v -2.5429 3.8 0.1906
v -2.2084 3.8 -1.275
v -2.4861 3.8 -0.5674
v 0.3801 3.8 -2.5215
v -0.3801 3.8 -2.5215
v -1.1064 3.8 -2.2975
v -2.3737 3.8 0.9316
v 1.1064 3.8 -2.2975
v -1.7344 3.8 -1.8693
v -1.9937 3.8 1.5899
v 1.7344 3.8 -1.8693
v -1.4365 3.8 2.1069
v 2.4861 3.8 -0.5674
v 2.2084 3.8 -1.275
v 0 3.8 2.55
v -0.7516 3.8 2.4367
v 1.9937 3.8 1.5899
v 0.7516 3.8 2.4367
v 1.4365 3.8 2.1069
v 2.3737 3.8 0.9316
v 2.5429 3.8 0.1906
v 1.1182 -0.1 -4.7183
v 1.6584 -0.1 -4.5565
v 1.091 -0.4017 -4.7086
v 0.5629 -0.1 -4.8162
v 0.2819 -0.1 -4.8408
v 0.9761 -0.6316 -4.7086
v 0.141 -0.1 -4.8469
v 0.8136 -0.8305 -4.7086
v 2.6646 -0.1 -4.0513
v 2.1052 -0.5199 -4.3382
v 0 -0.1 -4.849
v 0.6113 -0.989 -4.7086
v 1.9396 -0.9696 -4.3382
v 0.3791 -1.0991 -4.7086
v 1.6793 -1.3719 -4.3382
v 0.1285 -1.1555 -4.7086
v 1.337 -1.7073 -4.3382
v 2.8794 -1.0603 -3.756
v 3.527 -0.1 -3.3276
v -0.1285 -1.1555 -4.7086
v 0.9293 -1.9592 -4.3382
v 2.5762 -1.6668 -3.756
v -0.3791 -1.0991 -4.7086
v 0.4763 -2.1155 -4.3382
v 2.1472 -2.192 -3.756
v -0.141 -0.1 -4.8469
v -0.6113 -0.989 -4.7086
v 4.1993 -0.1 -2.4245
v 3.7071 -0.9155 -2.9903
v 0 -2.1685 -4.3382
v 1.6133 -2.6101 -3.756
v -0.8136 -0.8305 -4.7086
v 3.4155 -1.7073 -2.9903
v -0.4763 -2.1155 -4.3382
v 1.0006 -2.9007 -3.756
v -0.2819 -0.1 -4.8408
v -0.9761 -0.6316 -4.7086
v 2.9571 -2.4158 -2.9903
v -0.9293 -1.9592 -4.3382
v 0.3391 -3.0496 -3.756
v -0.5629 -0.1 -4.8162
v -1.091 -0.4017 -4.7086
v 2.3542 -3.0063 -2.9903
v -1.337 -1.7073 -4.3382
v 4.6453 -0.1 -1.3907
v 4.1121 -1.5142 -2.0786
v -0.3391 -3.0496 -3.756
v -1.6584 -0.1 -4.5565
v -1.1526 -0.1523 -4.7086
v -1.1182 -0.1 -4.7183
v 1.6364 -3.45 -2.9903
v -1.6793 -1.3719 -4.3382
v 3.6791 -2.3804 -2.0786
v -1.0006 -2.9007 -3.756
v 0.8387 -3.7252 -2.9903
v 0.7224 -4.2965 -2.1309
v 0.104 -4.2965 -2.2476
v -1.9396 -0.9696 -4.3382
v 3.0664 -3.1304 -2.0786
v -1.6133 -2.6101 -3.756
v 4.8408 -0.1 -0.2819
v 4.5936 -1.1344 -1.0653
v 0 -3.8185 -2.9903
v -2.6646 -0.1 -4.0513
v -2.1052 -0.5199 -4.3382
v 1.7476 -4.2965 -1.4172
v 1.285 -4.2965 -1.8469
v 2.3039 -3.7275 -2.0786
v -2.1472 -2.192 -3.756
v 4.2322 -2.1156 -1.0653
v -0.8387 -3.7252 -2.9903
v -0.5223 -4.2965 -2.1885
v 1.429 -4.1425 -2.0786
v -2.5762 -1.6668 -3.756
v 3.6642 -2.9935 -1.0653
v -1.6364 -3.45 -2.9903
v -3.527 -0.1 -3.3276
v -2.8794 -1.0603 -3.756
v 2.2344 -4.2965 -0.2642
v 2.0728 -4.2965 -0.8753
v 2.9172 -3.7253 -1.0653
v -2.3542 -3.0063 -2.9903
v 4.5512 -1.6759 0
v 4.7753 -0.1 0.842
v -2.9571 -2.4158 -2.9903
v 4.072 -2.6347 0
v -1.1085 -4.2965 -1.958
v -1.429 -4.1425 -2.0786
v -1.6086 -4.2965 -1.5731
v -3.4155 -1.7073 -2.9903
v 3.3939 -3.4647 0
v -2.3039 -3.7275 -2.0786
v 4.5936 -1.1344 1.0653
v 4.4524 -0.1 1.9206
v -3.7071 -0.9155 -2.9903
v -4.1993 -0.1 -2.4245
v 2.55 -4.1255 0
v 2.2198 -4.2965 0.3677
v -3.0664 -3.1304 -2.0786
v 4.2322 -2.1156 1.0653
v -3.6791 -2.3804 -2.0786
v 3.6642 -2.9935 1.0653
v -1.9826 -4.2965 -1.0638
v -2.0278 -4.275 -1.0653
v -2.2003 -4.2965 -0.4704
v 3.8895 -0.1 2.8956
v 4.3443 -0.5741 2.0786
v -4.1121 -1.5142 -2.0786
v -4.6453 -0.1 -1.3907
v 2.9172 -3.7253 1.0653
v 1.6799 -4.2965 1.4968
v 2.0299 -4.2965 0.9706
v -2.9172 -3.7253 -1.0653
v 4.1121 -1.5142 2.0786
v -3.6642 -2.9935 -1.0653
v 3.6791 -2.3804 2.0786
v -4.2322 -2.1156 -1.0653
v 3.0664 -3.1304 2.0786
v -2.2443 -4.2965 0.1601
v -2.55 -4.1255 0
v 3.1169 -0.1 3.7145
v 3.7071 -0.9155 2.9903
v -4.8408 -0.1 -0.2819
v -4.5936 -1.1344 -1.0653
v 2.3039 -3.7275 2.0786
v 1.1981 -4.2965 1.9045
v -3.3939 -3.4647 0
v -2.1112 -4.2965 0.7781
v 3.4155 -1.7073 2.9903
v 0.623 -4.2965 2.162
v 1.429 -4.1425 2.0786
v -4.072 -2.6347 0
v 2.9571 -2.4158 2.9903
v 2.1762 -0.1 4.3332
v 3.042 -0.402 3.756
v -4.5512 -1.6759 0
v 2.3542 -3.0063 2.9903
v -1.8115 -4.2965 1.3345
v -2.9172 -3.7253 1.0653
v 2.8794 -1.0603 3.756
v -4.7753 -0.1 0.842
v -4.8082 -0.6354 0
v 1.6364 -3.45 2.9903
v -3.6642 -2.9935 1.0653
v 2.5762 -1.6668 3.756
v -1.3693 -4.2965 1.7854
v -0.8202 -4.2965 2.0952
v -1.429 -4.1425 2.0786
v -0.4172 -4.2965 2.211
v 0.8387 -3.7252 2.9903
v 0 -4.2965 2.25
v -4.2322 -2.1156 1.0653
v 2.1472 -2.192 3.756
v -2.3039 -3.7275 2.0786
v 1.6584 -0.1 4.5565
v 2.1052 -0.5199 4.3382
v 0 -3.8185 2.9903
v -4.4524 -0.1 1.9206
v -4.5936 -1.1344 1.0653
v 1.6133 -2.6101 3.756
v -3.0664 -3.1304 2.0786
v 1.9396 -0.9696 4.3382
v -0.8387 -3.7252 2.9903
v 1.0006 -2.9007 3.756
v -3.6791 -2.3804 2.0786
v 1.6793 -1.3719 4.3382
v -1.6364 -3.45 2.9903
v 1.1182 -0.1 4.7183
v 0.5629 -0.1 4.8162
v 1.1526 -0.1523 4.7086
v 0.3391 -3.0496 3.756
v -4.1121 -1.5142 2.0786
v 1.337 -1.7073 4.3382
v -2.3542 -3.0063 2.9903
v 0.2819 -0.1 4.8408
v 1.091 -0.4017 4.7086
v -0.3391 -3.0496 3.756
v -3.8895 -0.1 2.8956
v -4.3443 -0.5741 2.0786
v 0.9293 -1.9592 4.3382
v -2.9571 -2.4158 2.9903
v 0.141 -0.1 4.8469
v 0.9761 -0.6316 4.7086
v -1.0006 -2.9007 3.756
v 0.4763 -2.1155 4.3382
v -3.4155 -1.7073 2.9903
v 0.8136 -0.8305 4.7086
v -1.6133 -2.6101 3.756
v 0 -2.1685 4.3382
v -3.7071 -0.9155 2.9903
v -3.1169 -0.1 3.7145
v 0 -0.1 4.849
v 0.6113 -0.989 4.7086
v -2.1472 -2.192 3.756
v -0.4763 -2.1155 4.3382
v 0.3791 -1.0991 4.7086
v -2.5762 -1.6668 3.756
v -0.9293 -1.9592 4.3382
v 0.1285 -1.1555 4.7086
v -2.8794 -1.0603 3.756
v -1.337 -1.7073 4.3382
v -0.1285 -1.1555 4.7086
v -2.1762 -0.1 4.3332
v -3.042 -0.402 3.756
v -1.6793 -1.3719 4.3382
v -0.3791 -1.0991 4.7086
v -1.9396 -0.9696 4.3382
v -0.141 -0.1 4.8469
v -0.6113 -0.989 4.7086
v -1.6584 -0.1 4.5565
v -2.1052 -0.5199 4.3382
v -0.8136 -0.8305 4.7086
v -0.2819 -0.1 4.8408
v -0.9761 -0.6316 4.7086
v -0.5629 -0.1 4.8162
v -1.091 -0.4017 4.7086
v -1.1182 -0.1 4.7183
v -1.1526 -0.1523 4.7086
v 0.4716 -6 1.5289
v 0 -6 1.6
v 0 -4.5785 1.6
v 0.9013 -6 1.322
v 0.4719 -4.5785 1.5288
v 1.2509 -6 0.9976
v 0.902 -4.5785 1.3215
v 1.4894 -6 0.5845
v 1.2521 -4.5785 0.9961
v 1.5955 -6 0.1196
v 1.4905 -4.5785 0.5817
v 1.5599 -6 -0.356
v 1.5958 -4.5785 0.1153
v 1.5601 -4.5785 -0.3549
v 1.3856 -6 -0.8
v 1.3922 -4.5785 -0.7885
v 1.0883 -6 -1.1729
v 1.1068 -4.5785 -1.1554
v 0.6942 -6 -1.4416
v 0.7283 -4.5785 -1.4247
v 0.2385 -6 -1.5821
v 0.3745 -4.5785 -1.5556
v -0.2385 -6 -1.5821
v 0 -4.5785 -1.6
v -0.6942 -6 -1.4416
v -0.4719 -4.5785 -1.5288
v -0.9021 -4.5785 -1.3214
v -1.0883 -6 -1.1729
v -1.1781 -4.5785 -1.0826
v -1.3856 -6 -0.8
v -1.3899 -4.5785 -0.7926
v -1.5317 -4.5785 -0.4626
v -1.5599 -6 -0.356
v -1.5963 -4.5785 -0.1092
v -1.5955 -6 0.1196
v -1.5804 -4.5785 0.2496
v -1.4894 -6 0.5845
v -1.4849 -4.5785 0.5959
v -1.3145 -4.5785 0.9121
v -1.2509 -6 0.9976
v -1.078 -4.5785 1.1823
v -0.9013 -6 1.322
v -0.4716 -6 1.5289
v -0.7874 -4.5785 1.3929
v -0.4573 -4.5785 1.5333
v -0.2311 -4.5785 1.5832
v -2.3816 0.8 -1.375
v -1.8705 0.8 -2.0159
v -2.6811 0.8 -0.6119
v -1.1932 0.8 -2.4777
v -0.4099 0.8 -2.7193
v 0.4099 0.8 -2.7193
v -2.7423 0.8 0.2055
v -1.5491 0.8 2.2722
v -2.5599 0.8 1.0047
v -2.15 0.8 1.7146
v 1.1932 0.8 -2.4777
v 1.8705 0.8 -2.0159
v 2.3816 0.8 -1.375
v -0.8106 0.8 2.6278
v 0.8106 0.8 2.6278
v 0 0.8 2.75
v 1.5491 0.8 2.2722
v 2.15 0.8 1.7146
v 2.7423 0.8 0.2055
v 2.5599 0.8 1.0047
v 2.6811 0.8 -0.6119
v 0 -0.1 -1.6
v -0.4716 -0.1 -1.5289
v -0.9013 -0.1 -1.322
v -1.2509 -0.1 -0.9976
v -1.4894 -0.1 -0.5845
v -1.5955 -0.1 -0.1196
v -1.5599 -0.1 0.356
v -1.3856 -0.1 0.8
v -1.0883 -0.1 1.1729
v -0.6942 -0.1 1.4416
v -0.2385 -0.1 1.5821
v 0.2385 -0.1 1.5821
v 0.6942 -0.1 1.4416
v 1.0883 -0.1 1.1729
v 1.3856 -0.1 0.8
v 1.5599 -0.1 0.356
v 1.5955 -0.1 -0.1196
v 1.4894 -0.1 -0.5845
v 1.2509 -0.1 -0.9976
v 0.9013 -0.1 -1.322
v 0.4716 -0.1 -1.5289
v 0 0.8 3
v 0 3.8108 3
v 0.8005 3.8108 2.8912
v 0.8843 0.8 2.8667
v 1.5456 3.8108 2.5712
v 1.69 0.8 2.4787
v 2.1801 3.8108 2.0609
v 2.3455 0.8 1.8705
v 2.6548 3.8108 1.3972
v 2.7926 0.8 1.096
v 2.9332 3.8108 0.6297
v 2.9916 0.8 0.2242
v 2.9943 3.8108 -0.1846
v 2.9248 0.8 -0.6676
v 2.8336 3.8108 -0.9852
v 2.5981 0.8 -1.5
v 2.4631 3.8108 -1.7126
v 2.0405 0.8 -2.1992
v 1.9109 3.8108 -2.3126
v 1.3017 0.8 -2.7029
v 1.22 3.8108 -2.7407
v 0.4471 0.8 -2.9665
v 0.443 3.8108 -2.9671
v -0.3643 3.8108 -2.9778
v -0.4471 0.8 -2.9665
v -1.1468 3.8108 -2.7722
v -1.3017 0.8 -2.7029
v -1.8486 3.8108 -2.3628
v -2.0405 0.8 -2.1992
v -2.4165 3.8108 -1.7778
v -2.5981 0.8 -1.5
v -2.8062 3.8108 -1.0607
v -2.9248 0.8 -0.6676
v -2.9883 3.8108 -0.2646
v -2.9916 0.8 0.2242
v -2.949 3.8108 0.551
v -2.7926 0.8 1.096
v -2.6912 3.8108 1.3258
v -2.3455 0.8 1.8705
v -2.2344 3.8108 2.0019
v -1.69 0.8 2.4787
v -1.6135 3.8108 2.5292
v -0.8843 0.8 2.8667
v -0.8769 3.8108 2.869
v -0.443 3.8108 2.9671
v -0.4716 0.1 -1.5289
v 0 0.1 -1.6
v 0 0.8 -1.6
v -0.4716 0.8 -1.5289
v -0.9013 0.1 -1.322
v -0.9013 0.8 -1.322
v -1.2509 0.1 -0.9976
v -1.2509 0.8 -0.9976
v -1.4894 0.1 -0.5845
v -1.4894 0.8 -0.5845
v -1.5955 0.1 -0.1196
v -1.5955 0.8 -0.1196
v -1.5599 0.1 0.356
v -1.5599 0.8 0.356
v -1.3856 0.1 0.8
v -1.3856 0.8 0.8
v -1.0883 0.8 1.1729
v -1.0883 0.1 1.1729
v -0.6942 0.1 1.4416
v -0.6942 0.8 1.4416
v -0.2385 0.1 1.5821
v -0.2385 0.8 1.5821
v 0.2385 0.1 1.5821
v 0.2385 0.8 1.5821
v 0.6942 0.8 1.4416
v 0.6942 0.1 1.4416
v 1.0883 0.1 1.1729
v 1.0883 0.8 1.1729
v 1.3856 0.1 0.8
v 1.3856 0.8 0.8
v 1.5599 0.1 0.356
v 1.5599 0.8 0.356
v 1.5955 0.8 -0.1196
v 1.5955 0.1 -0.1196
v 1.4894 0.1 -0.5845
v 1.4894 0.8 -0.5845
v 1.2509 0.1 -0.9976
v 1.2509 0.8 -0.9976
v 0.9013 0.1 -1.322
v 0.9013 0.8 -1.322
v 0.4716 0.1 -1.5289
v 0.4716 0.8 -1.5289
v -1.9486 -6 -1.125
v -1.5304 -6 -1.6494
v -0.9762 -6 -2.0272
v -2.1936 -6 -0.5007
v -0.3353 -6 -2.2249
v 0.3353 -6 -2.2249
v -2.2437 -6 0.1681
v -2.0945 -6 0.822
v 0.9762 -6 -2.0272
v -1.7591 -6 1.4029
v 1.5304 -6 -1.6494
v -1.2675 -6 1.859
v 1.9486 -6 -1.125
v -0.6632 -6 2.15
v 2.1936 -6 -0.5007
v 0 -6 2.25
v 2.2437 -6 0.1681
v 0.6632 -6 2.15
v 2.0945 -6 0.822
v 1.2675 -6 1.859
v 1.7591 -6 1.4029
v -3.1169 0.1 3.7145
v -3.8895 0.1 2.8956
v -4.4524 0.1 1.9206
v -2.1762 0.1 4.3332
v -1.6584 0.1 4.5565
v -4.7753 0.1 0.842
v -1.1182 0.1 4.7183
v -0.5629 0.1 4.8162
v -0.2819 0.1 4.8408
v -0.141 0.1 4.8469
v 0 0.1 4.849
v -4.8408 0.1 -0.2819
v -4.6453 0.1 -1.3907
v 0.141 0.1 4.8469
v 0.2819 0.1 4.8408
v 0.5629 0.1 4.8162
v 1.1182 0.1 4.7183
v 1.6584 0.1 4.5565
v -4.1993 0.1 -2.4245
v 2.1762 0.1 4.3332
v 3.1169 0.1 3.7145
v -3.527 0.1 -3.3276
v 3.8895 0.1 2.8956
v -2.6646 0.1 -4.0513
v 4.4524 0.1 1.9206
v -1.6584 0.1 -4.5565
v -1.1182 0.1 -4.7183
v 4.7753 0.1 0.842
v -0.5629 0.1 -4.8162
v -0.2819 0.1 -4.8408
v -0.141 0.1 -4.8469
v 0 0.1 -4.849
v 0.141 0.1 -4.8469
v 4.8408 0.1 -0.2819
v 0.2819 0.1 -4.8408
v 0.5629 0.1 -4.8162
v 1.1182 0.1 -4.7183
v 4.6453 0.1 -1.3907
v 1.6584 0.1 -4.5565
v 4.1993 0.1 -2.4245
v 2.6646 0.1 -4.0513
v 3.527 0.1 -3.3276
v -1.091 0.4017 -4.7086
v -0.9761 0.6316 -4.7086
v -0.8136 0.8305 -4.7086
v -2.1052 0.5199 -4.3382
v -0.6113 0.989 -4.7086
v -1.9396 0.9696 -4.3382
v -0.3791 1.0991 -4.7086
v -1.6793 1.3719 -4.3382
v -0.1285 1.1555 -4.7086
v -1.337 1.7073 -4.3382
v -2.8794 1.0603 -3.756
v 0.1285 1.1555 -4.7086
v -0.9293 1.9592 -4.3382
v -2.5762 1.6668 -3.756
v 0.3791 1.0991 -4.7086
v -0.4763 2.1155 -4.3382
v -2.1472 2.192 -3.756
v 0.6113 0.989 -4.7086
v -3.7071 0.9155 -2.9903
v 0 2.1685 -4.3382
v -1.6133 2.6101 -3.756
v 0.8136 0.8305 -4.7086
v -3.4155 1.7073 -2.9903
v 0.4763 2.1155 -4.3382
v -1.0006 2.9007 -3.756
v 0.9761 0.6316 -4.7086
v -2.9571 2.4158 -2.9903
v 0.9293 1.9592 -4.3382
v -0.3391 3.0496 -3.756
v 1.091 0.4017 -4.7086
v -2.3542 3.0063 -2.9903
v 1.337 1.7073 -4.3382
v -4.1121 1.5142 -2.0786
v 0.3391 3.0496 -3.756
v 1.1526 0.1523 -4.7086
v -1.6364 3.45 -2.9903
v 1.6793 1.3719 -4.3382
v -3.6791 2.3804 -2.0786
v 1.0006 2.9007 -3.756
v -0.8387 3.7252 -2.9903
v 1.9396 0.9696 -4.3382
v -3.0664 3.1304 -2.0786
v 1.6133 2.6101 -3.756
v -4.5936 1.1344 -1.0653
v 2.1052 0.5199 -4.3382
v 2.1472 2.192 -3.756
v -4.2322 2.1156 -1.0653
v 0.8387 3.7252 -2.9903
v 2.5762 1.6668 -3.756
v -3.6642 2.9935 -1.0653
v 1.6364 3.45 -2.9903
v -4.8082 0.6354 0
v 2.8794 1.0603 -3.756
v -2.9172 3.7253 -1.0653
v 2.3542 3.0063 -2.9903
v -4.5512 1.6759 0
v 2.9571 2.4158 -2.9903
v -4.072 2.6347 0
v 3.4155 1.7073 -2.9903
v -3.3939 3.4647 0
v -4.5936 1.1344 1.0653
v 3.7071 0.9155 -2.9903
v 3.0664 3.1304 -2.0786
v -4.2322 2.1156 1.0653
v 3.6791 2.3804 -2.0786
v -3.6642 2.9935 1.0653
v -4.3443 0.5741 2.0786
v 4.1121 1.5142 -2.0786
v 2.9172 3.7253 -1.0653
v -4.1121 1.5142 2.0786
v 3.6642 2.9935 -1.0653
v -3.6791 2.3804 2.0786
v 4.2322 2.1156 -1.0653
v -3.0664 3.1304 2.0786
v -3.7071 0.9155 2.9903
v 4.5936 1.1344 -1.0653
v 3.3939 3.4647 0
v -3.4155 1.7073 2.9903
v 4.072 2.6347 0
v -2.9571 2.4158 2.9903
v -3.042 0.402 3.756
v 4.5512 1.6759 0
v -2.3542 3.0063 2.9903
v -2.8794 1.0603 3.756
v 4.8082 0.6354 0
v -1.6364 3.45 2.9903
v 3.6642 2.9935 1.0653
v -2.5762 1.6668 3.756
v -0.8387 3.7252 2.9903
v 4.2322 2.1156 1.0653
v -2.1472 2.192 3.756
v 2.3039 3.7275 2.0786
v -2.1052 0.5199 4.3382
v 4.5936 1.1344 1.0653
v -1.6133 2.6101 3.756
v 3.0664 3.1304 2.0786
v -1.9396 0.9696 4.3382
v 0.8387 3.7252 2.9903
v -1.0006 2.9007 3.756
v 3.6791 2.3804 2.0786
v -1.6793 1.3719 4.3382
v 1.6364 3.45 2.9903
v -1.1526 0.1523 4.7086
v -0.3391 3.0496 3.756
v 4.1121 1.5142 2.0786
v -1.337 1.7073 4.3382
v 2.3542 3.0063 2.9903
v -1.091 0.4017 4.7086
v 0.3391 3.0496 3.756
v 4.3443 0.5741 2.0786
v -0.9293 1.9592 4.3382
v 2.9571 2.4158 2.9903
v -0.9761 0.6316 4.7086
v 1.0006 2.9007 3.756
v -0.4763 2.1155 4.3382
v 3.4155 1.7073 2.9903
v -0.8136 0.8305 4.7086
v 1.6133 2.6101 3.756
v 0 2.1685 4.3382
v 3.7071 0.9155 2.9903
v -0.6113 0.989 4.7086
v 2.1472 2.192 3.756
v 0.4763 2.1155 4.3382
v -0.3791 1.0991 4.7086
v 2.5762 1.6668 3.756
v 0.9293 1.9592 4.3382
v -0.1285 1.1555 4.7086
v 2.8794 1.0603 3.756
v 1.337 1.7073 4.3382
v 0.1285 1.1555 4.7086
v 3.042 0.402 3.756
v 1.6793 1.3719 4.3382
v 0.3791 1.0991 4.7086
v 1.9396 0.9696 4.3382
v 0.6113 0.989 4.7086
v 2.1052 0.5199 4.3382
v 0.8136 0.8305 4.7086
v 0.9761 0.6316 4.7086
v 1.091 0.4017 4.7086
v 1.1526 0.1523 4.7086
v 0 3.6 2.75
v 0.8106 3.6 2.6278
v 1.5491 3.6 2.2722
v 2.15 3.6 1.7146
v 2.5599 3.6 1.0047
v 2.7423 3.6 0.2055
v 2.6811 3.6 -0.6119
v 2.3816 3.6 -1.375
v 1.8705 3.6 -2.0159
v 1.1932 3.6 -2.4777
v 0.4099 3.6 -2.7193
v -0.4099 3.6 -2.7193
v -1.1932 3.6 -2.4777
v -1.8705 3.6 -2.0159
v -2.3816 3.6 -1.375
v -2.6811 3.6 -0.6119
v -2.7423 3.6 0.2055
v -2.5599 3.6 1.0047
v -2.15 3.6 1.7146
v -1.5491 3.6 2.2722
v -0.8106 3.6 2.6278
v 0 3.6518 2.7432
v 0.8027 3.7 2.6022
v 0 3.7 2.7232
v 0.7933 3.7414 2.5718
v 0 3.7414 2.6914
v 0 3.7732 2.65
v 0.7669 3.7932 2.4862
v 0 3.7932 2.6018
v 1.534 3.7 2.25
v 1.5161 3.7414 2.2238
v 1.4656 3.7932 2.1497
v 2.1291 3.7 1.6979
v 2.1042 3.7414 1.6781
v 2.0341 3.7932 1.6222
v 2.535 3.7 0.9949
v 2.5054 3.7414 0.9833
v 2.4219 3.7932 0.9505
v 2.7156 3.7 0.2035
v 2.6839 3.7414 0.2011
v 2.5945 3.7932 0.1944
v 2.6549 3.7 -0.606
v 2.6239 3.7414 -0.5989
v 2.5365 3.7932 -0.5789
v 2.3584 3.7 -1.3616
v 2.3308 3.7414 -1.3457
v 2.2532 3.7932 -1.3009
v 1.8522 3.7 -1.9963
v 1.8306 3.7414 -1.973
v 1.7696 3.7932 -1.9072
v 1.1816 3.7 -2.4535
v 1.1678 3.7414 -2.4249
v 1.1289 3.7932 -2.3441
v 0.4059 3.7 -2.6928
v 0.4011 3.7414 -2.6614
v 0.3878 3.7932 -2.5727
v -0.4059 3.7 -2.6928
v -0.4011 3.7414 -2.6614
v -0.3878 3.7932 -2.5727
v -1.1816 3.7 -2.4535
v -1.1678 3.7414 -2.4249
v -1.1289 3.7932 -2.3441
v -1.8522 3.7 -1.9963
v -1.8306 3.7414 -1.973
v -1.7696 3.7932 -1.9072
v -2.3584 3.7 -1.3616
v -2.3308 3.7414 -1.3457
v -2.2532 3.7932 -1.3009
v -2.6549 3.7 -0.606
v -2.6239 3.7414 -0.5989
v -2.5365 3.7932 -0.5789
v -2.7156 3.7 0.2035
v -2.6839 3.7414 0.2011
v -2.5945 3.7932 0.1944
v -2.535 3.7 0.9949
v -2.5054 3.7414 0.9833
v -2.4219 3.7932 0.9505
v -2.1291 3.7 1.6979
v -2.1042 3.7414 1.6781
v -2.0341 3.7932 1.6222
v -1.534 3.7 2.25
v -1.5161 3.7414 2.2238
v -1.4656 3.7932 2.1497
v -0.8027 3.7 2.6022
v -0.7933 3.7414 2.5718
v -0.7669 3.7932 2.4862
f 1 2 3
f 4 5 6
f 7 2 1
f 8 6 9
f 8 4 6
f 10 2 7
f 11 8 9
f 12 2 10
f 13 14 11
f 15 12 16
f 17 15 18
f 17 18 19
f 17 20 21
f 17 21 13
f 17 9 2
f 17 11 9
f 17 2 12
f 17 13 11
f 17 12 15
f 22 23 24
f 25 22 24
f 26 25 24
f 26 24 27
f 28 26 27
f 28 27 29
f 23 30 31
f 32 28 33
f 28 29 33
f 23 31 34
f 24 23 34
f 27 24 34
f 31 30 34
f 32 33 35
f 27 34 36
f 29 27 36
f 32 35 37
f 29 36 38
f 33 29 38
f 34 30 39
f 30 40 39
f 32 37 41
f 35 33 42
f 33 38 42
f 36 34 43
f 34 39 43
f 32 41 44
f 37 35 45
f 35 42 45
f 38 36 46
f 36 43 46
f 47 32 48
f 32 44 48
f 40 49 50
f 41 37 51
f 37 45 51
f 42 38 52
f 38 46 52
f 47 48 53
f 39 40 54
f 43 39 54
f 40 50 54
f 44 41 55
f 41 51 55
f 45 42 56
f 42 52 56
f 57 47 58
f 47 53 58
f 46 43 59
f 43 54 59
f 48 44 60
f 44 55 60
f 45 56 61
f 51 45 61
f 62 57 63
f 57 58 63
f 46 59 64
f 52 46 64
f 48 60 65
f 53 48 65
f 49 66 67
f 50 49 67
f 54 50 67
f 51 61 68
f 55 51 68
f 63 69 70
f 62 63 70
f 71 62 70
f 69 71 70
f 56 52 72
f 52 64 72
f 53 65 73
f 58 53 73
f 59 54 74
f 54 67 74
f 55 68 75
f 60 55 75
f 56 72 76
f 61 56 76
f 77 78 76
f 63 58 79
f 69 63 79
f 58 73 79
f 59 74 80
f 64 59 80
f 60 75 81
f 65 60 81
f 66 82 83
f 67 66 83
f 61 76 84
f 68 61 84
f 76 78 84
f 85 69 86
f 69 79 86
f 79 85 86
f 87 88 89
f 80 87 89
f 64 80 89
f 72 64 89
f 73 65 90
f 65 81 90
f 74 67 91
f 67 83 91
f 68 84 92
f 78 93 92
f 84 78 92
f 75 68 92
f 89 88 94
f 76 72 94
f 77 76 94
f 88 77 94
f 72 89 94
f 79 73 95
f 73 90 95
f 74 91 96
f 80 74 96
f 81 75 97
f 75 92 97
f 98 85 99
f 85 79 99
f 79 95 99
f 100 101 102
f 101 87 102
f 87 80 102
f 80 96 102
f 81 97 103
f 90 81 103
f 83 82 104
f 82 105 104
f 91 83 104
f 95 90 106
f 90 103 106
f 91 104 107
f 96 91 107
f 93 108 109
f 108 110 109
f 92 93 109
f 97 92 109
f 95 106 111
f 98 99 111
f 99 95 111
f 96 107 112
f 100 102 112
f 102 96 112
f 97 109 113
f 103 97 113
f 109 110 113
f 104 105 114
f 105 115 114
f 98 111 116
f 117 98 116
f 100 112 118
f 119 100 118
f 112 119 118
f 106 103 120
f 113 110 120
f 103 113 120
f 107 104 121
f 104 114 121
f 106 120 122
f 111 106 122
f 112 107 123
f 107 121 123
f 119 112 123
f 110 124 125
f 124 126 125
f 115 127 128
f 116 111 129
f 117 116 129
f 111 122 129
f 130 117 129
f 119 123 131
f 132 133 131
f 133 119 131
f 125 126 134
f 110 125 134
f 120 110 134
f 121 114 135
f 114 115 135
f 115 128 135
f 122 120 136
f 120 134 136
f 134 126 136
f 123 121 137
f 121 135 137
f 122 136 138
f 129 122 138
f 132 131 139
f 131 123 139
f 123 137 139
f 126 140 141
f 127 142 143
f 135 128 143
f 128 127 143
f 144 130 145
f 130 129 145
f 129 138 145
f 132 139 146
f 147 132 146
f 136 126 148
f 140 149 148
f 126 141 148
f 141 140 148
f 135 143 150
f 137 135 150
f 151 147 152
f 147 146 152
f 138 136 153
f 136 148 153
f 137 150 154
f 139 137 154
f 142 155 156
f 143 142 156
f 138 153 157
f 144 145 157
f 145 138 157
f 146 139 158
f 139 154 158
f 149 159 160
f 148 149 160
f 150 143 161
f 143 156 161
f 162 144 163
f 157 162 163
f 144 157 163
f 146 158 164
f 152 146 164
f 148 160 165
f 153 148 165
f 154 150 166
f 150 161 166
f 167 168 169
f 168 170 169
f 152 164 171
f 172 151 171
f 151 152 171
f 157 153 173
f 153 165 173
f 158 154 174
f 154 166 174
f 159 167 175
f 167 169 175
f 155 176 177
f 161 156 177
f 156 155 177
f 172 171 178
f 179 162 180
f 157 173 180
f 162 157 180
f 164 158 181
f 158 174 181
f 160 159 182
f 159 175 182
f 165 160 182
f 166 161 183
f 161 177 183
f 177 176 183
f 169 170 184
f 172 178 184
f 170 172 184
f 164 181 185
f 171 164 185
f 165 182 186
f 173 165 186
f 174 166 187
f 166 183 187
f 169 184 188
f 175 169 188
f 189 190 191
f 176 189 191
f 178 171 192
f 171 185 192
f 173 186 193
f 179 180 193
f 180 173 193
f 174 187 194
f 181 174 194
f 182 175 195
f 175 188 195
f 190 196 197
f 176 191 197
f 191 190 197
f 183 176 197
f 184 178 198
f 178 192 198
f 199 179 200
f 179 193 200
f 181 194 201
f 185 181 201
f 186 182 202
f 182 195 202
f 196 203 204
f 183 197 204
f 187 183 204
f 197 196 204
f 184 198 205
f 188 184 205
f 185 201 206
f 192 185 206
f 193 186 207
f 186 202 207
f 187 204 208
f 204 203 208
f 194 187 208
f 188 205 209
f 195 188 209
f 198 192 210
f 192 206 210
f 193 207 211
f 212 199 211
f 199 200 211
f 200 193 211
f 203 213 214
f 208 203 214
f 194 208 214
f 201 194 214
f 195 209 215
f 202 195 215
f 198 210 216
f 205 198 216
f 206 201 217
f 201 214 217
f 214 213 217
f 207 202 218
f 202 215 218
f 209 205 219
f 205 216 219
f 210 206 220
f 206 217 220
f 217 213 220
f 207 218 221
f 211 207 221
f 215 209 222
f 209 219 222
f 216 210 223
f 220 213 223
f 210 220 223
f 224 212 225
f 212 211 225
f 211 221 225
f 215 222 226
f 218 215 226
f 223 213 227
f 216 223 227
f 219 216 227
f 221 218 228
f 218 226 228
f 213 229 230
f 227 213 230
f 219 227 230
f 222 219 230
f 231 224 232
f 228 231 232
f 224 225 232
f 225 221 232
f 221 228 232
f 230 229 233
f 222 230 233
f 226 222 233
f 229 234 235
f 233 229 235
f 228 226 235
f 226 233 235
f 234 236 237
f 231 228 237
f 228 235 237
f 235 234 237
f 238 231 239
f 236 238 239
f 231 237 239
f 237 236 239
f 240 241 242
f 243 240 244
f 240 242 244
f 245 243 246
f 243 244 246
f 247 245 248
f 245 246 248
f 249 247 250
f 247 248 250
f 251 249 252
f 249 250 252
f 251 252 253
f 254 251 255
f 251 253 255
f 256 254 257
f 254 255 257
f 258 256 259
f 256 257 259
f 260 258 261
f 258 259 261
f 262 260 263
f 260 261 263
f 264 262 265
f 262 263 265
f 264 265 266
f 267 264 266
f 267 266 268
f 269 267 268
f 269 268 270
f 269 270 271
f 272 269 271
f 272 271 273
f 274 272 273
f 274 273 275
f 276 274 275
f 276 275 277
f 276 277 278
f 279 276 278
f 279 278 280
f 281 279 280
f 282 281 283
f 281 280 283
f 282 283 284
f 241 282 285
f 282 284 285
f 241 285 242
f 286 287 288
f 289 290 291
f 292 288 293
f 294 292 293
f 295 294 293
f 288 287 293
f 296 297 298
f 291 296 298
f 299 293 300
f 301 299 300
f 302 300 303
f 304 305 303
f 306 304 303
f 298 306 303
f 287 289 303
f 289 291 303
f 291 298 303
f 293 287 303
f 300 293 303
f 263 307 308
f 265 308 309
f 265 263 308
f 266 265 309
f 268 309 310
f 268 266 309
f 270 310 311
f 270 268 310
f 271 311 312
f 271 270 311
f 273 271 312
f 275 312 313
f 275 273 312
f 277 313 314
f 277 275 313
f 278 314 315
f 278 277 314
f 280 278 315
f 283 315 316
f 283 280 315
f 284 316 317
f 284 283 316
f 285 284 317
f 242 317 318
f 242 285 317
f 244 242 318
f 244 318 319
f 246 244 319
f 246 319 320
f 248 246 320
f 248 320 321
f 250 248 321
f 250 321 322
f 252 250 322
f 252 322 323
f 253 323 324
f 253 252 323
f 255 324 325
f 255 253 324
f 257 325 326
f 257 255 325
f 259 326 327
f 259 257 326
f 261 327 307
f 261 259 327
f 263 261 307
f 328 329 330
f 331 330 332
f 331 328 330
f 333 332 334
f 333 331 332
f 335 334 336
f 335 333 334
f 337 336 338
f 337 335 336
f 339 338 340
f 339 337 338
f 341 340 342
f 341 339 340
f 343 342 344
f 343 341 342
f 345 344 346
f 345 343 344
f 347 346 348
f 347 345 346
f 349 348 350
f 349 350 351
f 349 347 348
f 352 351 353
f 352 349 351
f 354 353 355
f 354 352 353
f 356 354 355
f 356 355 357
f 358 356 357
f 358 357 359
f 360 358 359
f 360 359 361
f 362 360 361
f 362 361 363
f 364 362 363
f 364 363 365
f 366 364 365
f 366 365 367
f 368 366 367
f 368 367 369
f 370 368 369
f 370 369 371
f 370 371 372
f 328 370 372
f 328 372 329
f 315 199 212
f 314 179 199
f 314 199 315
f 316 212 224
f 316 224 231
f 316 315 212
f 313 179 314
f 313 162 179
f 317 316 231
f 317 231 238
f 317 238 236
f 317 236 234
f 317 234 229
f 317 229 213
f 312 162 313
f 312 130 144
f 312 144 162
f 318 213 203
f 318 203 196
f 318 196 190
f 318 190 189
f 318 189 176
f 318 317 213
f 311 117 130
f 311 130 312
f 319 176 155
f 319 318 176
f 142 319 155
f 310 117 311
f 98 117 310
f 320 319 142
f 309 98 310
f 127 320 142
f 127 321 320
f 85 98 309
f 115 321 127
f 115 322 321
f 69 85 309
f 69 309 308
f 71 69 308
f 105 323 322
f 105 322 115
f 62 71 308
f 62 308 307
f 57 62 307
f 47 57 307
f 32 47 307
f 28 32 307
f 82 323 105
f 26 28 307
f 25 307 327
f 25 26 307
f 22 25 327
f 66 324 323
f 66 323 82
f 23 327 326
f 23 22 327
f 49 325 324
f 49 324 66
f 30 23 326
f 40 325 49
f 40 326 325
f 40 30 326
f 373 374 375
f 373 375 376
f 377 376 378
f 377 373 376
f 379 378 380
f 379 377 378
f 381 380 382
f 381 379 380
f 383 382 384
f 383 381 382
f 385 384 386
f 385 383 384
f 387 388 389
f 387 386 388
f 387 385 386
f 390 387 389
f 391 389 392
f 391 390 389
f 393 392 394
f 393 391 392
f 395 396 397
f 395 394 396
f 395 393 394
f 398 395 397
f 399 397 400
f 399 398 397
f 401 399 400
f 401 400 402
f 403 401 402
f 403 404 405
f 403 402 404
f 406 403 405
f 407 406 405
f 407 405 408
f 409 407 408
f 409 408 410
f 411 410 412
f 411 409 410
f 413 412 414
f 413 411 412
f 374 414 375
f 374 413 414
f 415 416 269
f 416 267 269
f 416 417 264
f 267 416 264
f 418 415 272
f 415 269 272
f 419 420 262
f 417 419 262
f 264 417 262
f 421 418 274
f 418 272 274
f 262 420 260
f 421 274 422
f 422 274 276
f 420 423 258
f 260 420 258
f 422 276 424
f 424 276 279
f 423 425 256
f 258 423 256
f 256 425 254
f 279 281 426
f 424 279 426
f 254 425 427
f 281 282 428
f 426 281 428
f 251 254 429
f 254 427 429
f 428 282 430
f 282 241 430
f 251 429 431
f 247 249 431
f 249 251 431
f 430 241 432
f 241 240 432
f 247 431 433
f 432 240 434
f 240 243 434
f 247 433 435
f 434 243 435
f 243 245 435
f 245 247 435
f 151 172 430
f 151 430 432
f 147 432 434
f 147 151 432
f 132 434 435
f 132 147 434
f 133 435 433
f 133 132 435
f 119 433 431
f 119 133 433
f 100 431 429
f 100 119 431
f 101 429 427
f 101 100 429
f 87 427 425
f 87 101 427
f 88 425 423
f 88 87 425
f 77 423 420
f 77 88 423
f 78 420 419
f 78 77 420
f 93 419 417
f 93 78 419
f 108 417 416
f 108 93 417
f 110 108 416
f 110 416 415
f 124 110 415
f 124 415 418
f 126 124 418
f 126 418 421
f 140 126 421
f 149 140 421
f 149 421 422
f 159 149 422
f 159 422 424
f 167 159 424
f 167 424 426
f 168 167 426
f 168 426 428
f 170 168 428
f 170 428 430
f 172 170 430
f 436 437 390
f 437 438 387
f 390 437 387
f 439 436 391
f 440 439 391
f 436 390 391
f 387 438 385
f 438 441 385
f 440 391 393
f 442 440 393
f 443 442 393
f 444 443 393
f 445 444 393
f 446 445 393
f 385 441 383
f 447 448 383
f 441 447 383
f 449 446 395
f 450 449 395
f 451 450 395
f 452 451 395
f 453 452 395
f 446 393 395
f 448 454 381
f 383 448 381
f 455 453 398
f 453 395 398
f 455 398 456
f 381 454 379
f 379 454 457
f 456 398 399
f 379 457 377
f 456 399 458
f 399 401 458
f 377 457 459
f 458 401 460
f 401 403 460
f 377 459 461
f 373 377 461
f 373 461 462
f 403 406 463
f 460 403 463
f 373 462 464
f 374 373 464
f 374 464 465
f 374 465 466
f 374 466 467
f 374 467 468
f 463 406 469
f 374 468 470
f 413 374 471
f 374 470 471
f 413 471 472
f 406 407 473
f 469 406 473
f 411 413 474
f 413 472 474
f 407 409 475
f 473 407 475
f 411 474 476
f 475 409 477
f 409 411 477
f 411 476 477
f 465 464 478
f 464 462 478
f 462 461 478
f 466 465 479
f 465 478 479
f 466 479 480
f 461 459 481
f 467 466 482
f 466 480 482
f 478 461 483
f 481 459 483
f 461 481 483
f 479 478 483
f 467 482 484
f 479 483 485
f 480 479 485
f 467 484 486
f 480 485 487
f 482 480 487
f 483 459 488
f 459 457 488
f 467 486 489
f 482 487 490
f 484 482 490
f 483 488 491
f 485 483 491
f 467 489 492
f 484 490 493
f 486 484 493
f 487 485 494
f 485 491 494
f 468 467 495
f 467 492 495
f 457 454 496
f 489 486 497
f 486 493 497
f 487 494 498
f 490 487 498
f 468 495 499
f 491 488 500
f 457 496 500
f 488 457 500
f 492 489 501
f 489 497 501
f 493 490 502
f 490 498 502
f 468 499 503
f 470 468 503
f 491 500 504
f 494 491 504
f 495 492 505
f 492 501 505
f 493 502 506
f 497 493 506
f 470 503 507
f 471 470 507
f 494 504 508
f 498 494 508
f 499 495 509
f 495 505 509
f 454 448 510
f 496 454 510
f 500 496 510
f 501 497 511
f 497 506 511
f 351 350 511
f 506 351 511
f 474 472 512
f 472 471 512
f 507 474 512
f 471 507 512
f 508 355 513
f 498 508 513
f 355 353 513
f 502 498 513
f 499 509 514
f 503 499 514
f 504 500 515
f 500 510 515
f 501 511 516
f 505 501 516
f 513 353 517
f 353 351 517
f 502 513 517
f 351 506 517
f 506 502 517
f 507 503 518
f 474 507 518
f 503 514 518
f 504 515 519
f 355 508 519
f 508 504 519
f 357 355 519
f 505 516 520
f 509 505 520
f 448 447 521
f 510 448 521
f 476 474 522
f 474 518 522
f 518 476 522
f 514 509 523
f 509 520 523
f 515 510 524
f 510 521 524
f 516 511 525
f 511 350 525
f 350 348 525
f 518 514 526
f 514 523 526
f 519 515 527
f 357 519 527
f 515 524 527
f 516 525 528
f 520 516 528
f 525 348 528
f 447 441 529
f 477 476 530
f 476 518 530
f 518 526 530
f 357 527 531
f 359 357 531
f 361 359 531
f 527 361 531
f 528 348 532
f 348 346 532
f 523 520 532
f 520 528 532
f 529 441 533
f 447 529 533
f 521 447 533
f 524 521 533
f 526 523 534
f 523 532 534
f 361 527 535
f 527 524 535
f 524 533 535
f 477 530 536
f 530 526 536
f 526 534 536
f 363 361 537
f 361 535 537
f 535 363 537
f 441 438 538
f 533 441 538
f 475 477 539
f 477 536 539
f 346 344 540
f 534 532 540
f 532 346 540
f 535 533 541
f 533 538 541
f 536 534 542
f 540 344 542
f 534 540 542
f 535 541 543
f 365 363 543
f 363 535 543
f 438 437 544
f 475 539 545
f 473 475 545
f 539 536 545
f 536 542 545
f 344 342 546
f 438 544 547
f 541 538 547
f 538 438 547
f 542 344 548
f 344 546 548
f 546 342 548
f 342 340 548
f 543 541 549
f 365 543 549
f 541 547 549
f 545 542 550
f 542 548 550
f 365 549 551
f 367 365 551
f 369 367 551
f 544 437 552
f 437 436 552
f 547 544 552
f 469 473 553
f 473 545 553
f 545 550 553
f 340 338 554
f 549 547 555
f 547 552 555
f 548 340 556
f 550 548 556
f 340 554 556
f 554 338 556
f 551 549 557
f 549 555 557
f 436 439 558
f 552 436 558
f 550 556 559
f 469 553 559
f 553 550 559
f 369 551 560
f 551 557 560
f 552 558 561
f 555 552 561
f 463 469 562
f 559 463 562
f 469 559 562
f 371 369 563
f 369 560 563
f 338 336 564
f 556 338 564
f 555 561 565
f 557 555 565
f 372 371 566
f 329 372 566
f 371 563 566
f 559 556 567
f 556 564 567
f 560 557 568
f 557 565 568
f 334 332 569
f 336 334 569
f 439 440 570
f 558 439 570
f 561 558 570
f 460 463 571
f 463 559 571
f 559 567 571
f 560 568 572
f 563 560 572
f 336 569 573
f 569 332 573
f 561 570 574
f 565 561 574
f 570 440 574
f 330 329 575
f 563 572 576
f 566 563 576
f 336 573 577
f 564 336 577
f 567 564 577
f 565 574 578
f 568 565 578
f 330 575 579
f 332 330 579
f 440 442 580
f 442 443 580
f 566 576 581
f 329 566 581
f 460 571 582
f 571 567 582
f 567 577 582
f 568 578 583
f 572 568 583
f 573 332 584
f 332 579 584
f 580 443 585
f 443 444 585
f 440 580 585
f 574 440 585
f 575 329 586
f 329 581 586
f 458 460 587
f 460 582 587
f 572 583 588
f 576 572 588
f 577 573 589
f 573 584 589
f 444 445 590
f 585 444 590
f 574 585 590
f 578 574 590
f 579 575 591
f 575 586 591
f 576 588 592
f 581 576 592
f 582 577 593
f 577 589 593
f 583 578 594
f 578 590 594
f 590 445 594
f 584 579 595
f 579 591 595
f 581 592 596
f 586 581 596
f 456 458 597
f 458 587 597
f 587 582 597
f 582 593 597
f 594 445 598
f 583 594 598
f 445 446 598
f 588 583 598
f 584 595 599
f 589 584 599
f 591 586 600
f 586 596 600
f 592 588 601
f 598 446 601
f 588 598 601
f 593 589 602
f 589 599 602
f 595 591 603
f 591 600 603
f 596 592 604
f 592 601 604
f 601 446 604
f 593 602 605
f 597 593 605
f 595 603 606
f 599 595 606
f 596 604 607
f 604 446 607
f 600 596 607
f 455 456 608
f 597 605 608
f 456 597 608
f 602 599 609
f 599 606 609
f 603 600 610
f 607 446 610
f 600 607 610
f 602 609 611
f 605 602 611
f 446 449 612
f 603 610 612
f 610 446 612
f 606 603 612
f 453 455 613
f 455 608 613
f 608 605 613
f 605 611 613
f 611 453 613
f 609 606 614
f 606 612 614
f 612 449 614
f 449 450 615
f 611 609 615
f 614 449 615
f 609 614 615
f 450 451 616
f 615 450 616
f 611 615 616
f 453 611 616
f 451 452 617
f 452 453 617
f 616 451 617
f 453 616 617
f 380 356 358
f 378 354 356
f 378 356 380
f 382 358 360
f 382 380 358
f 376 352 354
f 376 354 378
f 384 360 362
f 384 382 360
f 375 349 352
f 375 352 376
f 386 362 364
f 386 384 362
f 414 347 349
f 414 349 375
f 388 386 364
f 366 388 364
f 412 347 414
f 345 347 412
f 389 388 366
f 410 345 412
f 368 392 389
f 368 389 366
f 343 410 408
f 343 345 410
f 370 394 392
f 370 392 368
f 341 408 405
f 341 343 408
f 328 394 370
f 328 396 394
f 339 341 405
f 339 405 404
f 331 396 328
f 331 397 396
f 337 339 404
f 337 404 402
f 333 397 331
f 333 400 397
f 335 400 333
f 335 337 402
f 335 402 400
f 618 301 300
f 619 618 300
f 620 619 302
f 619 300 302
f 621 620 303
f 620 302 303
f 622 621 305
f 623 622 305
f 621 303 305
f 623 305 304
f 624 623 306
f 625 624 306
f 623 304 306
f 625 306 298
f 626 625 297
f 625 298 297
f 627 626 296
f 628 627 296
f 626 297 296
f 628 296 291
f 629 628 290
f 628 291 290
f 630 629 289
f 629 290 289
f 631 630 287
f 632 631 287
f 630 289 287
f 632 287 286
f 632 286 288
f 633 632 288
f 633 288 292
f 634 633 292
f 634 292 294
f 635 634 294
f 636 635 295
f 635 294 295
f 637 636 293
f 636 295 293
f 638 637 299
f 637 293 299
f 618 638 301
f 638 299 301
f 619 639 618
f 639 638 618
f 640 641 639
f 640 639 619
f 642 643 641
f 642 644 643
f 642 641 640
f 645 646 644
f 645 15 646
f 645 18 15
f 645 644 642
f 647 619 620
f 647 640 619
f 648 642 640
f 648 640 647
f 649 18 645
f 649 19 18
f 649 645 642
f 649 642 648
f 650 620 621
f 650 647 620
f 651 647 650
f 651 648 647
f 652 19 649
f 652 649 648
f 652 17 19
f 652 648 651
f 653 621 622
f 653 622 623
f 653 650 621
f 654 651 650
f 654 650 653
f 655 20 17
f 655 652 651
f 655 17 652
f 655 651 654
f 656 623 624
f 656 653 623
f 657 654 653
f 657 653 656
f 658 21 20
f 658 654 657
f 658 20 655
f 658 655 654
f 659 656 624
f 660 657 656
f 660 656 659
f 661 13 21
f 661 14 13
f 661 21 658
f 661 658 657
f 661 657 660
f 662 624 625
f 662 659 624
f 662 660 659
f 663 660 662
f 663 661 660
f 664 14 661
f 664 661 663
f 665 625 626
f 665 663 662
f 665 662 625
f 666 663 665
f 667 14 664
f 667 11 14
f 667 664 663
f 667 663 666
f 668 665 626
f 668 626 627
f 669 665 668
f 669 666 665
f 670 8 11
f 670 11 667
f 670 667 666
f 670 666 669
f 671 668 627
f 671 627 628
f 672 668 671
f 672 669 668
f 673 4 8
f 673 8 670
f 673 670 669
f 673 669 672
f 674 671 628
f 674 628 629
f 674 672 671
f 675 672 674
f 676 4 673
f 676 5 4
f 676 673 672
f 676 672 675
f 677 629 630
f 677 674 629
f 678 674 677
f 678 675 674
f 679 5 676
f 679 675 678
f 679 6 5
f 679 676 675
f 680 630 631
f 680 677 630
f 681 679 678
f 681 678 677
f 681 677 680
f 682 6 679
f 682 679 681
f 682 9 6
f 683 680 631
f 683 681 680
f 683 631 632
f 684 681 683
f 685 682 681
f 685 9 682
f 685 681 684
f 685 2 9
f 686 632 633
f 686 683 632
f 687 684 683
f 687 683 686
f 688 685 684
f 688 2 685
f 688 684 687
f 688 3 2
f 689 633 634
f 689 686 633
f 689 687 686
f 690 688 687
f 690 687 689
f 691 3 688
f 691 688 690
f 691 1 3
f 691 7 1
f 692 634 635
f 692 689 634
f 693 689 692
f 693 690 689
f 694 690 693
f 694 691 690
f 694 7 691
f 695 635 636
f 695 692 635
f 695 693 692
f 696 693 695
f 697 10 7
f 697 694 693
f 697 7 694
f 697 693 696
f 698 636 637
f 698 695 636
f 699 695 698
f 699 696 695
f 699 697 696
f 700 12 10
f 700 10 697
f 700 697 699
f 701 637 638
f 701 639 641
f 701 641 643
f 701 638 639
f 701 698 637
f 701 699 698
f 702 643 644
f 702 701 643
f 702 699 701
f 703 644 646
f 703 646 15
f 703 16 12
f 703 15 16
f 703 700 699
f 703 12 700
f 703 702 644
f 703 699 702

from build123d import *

# Parameters (mm, degrees)
CUT_EXTRUDE1_DEPTH      = 10
CUT_EXTRUDE1_DEPTH_BACK = 10
SKETCH2_R               = 1.6
SKETCH3_R               = 3
CUT_EXTRUDE2_DEPTH      = 10
SKETCH4_R               = 2.75
BOSS_EXTRUDE1_DEPTH     = 3
FILLET1_R               = 0.2
SKETCH5_R               = 2.25
SKETCH5_R_2             = 1.6
BOSS_EXTRUDE2_DEPTH     = 6
SKETCH6_R               = 6.07528897
CUT_EXTRUDE3_DEPTH      = 0.1


with BuildPart() as part:
    # Sketch1 → Revolve1 (revolve)
    with BuildSketch(Plane(origin=(0, 0, 0), x_dir=(1, 0, 0), z_dir=(0, 1, 0))):
        with BuildLine():
            Line((0, -4.85), (0, 4.85))
            ThreePointArc((0, 4.85), (4.85, 0), (0, -4.85))
        make_face()
    revolve(axis=Axis((0, 0, 4.85), (0, 0, -1)))

    # Sketch2 → Cut-Extrude1 (cut, two sides: drawn at the far end of the back side and taken through both)
    with BuildSketch(Plane(origin=(0, 0, 0), x_dir=(1, 0, 0), z_dir=(0, 1, 0)).offset(-CUT_EXTRUDE1_DEPTH_BACK)):
        Circle(SKETCH2_R)
    extrude(amount=CUT_EXTRUDE1_DEPTH + CUT_EXTRUDE1_DEPTH_BACK, mode=Mode.SUBTRACT)

    # Sketch3 → Cut-Extrude2 (cut)
    with BuildSketch(Plane(origin=(0, 0.8, 0), x_dir=(1, 0, 0), z_dir=(0, 1, 0))):
        Circle(SKETCH3_R)
    extrude(amount=CUT_EXTRUDE2_DEPTH, mode=Mode.SUBTRACT)

    # Sketch5 → Boss-Extrude2 (add)
    with BuildSketch(Plane(origin=(0, 0, 0), x_dir=(1, 0, 0), z_dir=(0, 1, 0))):
        Circle(SKETCH5_R)
        Circle(SKETCH5_R_2, mode=Mode.SUBTRACT)
    extrude(amount=-BOSS_EXTRUDE2_DEPTH)

    # Sketch6 → Cut-Extrude3 (cut, symmetric)
    with BuildSketch(Plane(origin=(0, 0, 0), x_dir=(1, 0, 0), z_dir=(0, 1, 0))):
        Circle(SKETCH6_R)
    extrude(amount=CUT_EXTRUDE3_DEPTH, both=True, mode=Mode.SUBTRACT)


with BuildPart() as body_2:
    # Sketch4 → Boss-Extrude1 (new body)
    with BuildSketch(Plane(origin=(0, 0.8, 0), x_dir=(1, 0, 0), z_dir=(0, 1, 0))):
        Circle(SKETCH4_R)
    extrude(amount=BOSS_EXTRUDE1_DEPTH)

    # Fillet1
    fillet1_edges = [body_2.edges().sort_by_distance(p)[0] for p in [
        (-2.75, 3.8, 0),
    ]]
    fillet(fillet1_edges, radius=FILLET1_R)


with BuildPart() as cut_extrude3_piece_1:
    # of the separate pieces the step leaves, piece 1, a body of its own (cut_extrude3_pieces)
    add(part.part.solids().sort_by_distance((0, -0.1, 4.848968963))[0])


with BuildPart() as cut_extrude3_piece_2:
    # of the separate pieces the step leaves, piece 2, a body of its own (cut_extrude3_pieces)
    add(part.part.solids().sort_by_distance((0, 0.1, 4.848968963))[0])


solid = Compound([body_2.part, cut_extrude3_piece_1.part, cut_extrude3_piece_2.part])
